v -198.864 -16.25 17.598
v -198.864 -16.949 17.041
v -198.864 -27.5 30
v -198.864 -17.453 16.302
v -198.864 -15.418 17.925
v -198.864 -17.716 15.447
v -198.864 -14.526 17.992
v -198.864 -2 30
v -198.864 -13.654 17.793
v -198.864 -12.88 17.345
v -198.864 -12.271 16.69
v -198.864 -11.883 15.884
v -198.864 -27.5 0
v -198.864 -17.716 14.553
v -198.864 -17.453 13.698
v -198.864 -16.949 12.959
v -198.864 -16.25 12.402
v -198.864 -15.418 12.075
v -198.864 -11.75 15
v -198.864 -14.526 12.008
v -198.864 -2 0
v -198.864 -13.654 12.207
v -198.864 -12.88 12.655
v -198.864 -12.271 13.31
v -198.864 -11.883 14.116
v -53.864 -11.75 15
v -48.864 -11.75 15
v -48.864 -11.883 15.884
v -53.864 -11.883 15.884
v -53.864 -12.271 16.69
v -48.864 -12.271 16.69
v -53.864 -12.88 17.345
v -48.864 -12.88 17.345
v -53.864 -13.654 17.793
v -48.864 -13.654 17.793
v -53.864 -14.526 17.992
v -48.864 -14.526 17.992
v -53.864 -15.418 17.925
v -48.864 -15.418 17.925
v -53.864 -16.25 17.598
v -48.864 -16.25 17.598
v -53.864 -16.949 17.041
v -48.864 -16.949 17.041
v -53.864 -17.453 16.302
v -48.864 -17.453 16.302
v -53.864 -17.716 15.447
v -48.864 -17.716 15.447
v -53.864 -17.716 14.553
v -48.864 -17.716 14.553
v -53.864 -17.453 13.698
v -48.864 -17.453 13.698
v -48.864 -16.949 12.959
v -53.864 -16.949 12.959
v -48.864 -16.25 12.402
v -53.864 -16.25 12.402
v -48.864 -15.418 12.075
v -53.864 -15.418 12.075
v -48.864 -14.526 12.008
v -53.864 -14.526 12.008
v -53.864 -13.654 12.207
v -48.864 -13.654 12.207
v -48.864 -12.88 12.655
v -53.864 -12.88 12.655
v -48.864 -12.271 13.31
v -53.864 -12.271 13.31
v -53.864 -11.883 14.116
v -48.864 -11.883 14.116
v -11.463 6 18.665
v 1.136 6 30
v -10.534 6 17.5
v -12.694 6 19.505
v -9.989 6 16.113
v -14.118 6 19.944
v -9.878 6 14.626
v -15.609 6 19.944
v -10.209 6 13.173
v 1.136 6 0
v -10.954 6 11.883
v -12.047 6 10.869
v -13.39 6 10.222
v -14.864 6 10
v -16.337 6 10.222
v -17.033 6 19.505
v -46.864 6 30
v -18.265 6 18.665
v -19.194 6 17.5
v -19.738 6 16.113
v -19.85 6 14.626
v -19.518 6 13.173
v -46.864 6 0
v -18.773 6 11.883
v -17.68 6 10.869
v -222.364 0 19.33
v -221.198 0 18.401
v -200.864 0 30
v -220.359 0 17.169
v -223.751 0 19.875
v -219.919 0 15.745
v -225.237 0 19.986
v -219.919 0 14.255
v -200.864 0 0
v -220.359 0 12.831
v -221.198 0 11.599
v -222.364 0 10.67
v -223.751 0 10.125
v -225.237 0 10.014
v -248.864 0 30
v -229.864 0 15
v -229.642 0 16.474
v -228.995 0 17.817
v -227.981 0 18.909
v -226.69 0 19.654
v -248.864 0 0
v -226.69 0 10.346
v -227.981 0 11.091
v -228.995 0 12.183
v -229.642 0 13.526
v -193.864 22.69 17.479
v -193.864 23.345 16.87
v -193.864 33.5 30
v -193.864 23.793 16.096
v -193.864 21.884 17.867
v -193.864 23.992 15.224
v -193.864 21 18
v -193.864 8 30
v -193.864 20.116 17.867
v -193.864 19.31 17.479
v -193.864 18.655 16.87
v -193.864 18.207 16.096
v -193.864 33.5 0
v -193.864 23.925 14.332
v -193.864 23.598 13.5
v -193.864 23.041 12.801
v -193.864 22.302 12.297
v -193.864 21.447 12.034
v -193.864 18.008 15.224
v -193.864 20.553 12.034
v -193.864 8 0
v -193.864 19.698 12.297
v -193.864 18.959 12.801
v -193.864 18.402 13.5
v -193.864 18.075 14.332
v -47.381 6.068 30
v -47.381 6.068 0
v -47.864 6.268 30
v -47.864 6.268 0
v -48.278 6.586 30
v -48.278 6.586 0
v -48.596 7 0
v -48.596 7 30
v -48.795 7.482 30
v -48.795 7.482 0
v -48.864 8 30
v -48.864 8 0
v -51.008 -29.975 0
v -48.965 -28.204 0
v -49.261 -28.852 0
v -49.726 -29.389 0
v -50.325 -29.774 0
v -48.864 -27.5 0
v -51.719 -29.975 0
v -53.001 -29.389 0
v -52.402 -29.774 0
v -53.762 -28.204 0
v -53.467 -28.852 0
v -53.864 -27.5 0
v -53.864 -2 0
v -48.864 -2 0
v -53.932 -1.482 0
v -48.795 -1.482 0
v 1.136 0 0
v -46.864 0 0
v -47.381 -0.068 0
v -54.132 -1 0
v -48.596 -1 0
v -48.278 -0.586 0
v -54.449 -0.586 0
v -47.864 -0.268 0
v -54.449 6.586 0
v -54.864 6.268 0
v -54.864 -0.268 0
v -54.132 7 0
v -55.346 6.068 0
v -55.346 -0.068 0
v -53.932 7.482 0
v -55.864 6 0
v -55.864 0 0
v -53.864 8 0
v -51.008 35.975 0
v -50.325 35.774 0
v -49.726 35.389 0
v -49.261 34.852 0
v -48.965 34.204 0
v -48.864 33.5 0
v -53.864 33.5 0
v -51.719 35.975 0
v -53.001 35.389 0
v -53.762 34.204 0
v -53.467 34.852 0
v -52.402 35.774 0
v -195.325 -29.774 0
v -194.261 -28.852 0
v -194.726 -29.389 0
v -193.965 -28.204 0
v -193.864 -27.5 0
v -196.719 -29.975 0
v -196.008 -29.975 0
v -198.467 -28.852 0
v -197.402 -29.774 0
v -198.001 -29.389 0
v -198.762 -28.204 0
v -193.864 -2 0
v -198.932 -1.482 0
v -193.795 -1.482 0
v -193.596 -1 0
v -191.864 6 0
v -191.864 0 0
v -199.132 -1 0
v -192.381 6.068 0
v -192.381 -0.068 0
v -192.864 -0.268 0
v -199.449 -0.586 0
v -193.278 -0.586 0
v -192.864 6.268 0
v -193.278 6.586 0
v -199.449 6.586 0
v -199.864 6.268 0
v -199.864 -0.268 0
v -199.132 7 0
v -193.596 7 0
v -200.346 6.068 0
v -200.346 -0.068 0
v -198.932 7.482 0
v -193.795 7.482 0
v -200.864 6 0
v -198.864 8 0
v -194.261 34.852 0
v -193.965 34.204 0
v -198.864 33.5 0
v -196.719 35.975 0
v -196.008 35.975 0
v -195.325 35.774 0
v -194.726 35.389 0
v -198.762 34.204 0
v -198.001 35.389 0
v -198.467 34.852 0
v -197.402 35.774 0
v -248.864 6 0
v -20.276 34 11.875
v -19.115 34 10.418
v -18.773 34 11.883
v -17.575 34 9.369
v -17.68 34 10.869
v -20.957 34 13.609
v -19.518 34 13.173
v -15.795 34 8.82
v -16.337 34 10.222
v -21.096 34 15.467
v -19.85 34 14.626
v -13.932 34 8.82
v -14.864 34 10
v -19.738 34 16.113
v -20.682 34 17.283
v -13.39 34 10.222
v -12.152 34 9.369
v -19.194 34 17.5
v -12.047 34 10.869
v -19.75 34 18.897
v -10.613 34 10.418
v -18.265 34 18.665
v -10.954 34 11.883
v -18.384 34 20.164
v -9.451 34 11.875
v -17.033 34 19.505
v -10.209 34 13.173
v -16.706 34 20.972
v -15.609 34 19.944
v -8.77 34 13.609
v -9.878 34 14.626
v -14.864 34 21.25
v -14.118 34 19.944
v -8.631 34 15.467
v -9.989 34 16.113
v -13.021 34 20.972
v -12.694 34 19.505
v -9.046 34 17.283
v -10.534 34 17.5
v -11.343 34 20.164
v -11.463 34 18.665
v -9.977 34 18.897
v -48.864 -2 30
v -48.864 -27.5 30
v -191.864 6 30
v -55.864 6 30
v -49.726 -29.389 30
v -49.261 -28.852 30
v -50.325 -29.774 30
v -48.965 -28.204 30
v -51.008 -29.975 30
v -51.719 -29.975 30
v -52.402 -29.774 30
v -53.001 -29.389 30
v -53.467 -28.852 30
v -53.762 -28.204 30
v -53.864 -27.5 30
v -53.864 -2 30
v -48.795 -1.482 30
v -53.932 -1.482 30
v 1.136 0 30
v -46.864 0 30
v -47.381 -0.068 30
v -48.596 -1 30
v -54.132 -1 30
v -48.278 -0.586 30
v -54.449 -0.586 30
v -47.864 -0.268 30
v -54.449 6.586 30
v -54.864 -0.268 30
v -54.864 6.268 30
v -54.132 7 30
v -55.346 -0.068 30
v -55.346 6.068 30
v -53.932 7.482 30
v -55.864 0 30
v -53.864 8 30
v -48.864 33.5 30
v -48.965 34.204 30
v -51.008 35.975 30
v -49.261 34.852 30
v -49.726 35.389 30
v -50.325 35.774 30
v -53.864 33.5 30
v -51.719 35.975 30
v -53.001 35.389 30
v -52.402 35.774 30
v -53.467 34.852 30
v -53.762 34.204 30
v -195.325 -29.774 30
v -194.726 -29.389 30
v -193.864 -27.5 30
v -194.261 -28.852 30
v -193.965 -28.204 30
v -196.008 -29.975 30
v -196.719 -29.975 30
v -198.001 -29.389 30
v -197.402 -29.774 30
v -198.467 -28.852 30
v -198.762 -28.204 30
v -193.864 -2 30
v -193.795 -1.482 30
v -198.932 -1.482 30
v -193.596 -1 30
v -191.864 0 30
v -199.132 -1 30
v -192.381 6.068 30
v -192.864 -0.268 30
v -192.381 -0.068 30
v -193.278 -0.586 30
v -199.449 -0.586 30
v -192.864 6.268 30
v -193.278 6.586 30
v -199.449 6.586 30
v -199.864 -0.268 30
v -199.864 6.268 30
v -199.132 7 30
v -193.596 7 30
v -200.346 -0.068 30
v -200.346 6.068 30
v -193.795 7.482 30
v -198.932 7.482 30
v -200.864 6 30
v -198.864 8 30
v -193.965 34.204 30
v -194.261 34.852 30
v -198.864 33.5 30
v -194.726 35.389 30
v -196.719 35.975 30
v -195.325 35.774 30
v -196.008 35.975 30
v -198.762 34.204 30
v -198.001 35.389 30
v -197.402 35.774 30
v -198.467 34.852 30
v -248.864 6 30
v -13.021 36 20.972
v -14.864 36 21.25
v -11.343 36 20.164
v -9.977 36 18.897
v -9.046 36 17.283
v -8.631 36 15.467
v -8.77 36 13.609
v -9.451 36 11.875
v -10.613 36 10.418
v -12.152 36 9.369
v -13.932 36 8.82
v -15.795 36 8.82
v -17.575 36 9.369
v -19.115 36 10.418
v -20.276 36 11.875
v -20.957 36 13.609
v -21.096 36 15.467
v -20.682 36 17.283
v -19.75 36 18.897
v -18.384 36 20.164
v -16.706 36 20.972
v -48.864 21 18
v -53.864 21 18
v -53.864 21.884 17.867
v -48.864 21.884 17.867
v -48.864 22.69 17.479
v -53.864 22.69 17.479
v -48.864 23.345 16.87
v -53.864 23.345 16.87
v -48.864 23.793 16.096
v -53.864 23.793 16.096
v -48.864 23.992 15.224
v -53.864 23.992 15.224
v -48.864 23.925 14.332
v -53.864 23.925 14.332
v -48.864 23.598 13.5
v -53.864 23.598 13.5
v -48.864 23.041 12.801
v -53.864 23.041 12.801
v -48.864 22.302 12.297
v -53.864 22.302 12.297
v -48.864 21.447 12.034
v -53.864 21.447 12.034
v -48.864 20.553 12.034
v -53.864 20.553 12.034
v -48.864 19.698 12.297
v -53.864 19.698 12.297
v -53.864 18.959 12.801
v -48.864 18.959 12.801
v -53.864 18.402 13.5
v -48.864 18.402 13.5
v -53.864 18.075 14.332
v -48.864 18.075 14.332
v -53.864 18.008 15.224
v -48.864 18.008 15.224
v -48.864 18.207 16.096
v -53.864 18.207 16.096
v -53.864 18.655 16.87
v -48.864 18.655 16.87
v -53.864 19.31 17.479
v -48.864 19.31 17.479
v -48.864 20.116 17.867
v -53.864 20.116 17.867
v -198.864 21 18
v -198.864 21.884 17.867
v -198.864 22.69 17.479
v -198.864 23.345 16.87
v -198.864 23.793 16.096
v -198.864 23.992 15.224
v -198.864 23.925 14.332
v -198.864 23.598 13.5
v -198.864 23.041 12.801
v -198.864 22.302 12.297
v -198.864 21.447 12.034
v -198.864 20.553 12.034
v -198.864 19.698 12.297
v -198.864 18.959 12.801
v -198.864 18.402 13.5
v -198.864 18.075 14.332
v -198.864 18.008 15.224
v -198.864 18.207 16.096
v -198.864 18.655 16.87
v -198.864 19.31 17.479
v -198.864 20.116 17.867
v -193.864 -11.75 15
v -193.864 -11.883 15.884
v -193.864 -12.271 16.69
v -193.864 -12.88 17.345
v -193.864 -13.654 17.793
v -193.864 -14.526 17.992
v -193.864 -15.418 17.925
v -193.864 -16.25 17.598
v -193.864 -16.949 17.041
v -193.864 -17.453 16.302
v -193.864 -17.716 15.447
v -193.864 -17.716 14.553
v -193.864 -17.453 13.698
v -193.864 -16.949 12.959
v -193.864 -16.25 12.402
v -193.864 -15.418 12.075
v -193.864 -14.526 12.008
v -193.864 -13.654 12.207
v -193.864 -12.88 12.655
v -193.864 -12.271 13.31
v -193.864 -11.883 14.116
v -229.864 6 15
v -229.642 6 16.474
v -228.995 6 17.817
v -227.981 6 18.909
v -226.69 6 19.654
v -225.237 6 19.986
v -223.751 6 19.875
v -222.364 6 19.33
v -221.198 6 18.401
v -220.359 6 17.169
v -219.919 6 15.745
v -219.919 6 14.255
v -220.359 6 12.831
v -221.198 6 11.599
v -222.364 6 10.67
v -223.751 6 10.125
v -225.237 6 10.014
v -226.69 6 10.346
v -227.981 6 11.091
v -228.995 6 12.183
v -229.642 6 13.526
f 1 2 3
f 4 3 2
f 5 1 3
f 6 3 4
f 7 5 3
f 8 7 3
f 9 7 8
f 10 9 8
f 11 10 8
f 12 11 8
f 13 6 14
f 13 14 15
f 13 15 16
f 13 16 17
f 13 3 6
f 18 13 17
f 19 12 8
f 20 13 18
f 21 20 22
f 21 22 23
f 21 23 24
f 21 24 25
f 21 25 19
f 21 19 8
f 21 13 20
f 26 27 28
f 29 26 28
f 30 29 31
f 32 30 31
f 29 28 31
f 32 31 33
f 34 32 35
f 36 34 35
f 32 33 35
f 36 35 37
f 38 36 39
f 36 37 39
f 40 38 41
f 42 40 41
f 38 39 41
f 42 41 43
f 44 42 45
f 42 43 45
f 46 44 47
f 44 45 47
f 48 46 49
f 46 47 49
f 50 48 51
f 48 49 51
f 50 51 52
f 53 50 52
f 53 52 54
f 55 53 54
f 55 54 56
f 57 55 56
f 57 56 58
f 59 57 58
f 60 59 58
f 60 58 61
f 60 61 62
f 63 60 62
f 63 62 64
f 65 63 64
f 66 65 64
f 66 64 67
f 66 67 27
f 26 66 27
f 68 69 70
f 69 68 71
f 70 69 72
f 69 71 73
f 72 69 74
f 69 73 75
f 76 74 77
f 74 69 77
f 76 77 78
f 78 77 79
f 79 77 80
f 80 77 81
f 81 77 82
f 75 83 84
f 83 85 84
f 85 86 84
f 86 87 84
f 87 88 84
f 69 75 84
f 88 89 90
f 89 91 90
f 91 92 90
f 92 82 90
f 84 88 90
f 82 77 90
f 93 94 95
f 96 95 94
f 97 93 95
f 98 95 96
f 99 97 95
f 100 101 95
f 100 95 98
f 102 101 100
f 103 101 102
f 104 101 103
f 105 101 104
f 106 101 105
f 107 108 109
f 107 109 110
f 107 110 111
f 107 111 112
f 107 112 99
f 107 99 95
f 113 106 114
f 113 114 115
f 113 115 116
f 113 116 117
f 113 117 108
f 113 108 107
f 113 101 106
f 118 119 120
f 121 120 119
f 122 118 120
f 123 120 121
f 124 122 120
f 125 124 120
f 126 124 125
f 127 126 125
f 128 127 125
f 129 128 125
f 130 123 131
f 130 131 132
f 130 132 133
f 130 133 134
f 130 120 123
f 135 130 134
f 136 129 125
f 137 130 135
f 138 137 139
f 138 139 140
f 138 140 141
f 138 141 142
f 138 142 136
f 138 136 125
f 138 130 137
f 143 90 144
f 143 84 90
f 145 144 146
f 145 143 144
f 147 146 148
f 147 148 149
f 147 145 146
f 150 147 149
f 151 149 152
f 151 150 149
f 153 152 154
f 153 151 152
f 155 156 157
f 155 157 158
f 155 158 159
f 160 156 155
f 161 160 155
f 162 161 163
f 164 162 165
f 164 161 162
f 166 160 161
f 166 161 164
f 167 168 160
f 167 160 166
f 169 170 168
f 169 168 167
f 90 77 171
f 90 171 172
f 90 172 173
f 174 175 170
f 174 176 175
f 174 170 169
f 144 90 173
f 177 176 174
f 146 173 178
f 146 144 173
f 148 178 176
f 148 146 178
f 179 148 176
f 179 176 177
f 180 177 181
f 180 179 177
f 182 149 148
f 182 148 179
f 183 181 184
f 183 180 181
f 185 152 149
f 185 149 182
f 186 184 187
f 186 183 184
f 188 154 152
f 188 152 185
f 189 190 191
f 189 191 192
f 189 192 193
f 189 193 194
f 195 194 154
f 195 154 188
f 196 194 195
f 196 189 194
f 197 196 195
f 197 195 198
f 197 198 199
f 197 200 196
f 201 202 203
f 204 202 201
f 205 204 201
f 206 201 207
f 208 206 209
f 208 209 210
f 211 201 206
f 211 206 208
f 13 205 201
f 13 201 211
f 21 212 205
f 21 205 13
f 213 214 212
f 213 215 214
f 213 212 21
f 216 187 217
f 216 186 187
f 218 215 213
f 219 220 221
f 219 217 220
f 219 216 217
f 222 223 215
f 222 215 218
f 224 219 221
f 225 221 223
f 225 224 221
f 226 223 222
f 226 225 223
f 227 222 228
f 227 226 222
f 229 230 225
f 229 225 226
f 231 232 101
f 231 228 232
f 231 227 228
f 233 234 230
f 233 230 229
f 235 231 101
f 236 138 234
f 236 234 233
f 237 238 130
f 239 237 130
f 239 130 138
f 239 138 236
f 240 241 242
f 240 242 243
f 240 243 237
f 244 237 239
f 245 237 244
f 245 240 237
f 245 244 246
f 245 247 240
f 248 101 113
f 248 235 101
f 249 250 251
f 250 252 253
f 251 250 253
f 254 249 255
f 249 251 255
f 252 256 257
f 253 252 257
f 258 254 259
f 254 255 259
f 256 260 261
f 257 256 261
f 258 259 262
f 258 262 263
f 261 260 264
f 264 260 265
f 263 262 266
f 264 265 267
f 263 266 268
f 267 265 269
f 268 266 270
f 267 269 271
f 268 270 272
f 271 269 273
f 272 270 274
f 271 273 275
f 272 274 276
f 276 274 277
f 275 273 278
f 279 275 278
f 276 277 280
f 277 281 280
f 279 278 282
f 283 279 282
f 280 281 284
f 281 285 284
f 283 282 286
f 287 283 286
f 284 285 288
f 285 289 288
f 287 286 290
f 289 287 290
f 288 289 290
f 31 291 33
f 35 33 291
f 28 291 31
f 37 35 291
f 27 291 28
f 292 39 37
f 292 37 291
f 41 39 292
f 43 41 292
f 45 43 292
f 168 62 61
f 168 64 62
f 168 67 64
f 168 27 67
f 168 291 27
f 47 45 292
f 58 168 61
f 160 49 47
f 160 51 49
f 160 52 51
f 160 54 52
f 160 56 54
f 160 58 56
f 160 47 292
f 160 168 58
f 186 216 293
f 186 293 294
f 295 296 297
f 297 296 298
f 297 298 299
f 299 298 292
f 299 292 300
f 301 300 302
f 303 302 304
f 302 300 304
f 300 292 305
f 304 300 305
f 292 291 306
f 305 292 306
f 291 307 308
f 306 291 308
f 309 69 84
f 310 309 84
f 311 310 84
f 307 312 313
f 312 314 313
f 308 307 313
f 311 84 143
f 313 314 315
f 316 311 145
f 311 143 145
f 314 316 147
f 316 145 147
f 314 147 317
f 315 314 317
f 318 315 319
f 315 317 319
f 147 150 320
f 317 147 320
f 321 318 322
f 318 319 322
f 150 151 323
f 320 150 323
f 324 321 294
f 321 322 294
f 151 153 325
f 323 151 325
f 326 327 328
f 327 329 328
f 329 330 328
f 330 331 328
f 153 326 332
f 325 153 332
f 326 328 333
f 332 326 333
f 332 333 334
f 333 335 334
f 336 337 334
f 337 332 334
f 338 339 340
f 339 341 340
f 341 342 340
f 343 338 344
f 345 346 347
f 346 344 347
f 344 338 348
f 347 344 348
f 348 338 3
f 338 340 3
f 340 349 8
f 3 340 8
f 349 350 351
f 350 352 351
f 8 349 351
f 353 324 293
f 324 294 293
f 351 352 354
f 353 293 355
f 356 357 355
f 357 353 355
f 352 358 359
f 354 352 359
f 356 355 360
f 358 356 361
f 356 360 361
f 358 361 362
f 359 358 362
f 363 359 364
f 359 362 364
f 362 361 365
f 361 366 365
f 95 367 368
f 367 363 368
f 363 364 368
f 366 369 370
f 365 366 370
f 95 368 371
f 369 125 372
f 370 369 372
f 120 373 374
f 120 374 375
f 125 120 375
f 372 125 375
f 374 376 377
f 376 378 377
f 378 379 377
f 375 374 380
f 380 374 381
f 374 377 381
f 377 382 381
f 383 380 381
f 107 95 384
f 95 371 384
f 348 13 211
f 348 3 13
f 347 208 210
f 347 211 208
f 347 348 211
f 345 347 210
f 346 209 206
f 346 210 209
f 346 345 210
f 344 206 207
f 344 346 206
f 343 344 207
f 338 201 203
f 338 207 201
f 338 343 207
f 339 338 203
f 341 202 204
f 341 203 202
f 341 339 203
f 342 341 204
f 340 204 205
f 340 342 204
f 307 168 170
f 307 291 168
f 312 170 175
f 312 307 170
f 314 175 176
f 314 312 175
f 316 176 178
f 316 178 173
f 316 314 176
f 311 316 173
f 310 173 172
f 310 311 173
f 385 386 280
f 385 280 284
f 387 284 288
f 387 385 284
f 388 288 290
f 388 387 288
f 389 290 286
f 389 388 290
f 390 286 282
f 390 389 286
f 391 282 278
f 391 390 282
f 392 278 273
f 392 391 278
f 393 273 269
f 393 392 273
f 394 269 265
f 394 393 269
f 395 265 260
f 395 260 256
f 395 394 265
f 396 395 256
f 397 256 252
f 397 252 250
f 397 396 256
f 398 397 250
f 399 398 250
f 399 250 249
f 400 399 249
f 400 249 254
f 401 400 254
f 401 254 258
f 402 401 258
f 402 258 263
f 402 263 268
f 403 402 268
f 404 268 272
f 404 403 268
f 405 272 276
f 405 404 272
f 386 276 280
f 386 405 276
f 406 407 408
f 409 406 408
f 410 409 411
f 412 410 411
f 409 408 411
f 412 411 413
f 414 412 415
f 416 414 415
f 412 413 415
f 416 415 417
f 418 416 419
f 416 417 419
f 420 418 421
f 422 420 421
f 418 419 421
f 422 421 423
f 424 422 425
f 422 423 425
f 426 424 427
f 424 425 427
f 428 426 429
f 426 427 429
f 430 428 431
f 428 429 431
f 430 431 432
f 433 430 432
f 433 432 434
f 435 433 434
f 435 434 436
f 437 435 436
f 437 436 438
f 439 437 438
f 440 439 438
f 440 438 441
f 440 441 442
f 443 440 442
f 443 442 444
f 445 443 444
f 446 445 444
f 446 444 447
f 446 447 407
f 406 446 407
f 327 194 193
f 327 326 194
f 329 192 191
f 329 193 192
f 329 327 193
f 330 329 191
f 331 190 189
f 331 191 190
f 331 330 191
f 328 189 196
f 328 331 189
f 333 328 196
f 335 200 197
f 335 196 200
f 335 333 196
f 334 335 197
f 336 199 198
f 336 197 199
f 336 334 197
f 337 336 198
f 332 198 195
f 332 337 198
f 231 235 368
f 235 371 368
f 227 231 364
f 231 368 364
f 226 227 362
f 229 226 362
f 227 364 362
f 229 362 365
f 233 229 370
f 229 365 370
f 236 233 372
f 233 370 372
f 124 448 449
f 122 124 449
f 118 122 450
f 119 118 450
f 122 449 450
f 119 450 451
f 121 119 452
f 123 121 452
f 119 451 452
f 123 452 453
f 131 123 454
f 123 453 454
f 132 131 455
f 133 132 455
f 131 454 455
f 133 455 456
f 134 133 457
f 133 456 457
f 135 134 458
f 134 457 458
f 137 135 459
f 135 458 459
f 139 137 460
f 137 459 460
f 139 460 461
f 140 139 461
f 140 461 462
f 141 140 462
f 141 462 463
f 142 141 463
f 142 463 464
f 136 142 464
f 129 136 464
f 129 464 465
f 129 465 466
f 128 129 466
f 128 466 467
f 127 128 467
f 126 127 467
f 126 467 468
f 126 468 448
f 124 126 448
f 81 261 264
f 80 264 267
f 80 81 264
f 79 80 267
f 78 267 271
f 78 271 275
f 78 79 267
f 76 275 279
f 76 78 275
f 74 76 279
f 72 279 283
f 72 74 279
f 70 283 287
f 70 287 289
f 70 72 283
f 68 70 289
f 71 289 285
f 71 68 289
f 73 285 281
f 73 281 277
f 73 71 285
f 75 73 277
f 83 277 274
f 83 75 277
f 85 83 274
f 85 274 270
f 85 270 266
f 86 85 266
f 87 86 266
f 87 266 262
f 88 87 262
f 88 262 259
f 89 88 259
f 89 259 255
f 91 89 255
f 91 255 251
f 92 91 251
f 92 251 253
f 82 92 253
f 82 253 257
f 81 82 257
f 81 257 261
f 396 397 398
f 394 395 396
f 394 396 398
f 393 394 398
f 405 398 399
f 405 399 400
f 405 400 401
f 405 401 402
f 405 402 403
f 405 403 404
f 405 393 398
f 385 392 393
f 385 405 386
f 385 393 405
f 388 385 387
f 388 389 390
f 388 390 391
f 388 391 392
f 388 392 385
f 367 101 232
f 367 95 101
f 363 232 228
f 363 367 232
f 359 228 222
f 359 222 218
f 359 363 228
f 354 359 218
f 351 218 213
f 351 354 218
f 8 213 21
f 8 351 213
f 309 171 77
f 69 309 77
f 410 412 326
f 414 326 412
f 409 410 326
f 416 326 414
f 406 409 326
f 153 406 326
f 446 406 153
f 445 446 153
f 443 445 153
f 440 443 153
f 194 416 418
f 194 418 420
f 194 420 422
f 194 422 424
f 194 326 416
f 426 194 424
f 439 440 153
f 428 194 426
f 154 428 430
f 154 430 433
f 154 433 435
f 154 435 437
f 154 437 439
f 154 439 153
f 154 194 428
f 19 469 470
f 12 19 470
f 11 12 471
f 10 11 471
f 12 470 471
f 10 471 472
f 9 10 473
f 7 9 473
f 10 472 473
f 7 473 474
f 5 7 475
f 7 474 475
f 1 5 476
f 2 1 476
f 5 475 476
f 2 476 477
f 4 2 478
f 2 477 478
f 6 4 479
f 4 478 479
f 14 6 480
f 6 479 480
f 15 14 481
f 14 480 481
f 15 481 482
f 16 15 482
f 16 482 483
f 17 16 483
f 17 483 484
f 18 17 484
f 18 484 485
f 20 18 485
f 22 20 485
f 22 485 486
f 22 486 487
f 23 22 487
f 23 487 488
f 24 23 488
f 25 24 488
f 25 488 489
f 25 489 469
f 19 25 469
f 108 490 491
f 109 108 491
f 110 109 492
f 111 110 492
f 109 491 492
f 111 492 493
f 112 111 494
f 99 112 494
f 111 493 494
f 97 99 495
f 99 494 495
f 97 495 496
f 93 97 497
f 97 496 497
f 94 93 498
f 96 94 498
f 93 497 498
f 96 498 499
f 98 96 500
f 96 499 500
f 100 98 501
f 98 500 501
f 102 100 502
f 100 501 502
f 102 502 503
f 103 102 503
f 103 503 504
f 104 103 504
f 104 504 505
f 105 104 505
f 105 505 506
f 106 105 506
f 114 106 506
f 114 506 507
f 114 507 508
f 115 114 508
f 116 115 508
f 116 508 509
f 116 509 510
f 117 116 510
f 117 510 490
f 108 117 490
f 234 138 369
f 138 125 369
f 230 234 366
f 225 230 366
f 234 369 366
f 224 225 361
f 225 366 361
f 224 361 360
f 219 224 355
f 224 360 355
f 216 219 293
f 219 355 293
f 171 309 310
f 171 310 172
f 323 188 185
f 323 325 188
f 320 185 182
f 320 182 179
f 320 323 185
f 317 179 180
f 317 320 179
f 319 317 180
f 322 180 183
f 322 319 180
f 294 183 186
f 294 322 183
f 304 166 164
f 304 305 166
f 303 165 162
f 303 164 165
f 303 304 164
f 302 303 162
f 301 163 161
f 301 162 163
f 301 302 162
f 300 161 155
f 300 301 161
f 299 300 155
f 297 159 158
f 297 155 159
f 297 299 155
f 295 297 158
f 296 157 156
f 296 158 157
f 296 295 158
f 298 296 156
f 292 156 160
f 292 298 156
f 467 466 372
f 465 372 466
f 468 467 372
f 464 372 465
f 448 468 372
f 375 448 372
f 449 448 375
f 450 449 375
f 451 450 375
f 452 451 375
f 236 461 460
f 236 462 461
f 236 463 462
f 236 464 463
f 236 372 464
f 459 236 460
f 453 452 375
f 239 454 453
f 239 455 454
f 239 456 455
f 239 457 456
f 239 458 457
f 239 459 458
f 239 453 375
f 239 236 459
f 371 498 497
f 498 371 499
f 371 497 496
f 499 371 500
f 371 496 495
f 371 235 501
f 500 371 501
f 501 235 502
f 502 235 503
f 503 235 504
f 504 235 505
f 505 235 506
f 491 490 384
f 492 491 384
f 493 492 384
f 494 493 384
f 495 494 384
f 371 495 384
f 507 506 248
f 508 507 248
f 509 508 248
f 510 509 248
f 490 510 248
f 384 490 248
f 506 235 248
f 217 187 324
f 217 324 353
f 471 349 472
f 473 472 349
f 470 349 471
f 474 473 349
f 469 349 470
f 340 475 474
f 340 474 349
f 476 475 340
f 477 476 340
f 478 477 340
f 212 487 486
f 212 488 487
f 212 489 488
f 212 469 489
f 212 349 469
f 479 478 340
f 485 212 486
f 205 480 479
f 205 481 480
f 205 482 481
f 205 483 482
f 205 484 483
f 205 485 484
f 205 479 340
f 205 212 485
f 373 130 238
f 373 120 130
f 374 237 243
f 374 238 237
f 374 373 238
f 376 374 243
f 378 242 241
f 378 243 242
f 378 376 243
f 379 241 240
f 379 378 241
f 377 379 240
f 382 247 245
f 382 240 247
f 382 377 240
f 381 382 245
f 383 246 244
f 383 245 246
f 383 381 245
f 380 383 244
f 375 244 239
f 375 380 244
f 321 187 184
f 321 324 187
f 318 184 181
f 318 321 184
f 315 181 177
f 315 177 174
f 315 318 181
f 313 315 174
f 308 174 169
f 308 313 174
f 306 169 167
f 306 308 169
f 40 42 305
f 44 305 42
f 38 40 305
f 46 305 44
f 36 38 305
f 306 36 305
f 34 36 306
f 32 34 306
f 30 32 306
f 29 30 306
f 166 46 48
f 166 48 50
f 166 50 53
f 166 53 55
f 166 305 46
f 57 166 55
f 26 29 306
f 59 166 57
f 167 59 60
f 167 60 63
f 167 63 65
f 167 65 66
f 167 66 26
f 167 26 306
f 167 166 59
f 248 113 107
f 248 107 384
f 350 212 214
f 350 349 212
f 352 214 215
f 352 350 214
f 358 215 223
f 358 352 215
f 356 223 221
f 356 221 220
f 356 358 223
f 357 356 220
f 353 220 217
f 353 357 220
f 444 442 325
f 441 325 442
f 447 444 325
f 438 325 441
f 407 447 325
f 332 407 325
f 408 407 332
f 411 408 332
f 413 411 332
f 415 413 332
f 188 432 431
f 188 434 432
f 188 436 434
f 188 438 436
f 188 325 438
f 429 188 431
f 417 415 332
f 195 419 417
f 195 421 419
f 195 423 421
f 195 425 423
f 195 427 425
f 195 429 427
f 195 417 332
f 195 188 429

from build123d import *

# Parameters (mm, degrees)
BOSS_EXTRUDE1_DEPTH  = 30
FILLET1_R            = 2
FILLET2_RADIUS       = 2.5
FILLET2_LENGTH       = 30
FILLET3_RADIUS       = 2.5
FILLET3_LENGTH       = 30
FILLET4_R            = 2
SKETCH2_R            = 3
CUT_EXTRUDE4_DEPTH   = 163
SKETCH9_W            = 10
SKETCH9_H            = 6
BOSS_EXTRUDE8_DEPTH  = 30
SKETCH14_W           = 20
SKETCH14_H           = 6
BOSS_EXTRUDE12_DEPTH = 30
FILLET10_RADIUS      = 2.5
FILLET10_LENGTH      = 30
FILLET11_RADIUS      = 2.5
FILLET11_LENGTH      = 30
FILLET12_R           = 2
SKETCH16_R           = 3
CUT_EXTRUDE6_DEPTH   = 200
SKETCH17_W           = 30
SKETCH17_H           = 6
BOSS_EXTRUDE15_DEPTH = 30
SKETCH20_R           = 5
BOSS_EXTRUDE16_DEPTH = 36
SKETCH21_R           = 6.25
BOSS_EXTRUDE17_DEPTH = 2
SKETCH22_R           = 5
CUT_EXTRUDE7_DEPTH   = 10


with BuildPart() as part:
    # Sketch1 → Boss-Extrude1 (new body)
    with BuildSketch(Plane.XY):
        Polygon((-28.863636364, 0), (-48.863636364, 0), (-48.863636364, -30), (-53.863636364, -30), (-53.863636364, 0), (-193.863636364, 0), (-193.863636364, -30), (-198.863636364, -30), (-198.863636364, 0), (-218.863636364, 0), (-218.863636364, 6), (-198.863636364, 6), (-198.863636364, 36), (-193.863636364, 36), (-193.863636364, 6), (-53.863636364, 6), (-53.863636364, 36), (-48.863636364, 36), (-48.863636364, 6), (-28.863636364, 6), align=None)
    extrude(amount=BOSS_EXTRUDE1_DEPTH)

    # Fillet1
    fillet1_edges = [part.edges().sort_by_distance(p)[0] for p in [
        (-198.863636364, 6, 15),
        (-193.863636364, 6, 15),
    ]]
    fillet(fillet1_edges, radius=FILLET1_R)

    # Fillet2: full round fillet: the end face becomes a half cylinder, R = half its width
    fillet2_face = Plane((-196.363636364, 36, 15), x_dir=(0, 0, 1), z_dir=(0, 1, 0))  # on the end face: x along it, z out of the body
    fillet2_slab = fillet2_face.offset(-FILLET2_RADIUS / 2) * Box(FILLET2_LENGTH, 2 * FILLET2_RADIUS, FILLET2_RADIUS, mode=Mode.PRIVATE)  # the body's end, R deep
    fillet2_round = Plane((-196.363636364, 33.5, 15), x_dir=(0, 1, 0), z_dir=(0, 0, 1)) * Cylinder(FILLET2_RADIUS, FILLET2_LENGTH, mode=Mode.PRIVATE)  # its axis R under the face
    add(fillet2_slab - fillet2_round, mode=Mode.SUBTRACT)

    # Fillet3: full round fillet: the end face becomes a half cylinder, R = half its width
    fillet3_face = Plane((-51.363636364, 36, 15), x_dir=(0, 0, 1), z_dir=(0, 1, 0))  # on the end face: x along it, z out of the body
    fillet3_slab = fillet3_face.offset(-FILLET3_RADIUS / 2) * Box(FILLET3_LENGTH, 2 * FILLET3_RADIUS, FILLET3_RADIUS, mode=Mode.PRIVATE)  # the body's end, R deep
    fillet3_round = Plane((-51.363636364, 33.5, 15), x_dir=(0, 1, 0), z_dir=(0, 0, 1)) * Cylinder(FILLET3_RADIUS, FILLET3_LENGTH, mode=Mode.PRIVATE)  # its axis R under the face
    add(fillet3_slab - fillet3_round, mode=Mode.SUBTRACT)

    # Fillet4
    fillet4_edges = [part.edges().sort_by_distance(p)[0] for p in [
        (-53.863636364, 6, 15),
        (-48.863636364, 6, 15),
    ]]
    fillet(fillet4_edges, radius=FILLET4_R)

    # Sketch2 → Cut-Extrude4 (cut)
    with BuildSketch(Plane.ZY.offset(198.863636364)):
        with Locations((15, 21)):
            Circle(SKETCH2_R)
    extrude(amount=-CUT_EXTRUDE4_DEPTH, mode=Mode.SUBTRACT)

    # Sketch9 → Boss-Extrude8 (add)
    with BuildSketch(Plane(origin=(0, 0, 0), x_dir=(-1, 0, 0), z_dir=(0, 0, -1))):
        with Locations((223.863636364, 3)):
            Rectangle(SKETCH9_W, SKETCH9_H)
    extrude(amount=-BOSS_EXTRUDE8_DEPTH)

    # Sketch14 → Boss-Extrude12 (add)
    with BuildSketch(Plane(origin=(0, 0, 0), x_dir=(-1, 0, 0), z_dir=(0, 0, -1))):
        with Locations((238.863636364, 3)):
            Rectangle(SKETCH14_W, SKETCH14_H)
    extrude(amount=-BOSS_EXTRUDE12_DEPTH)

    # Fillet10: full round fillet: the end face becomes a half cylinder, R = half its width
    fillet10_face = Plane((-51.363636364, -30, 15), x_dir=(0, 0, 1), z_dir=(0, -1, 0))  # on the end face: x along it, z out of the body
    fillet10_slab = fillet10_face.offset(-FILLET10_RADIUS / 2) * Box(FILLET10_LENGTH, 2 * FILLET10_RADIUS, FILLET10_RADIUS, mode=Mode.PRIVATE)  # the body's end, R deep
    fillet10_round = Plane((-51.363636364, -27.5, 15), x_dir=(0, -1, 0), z_dir=(0, 0, 1)) * Cylinder(FILLET10_RADIUS, FILLET10_LENGTH, mode=Mode.PRIVATE)  # its axis R under the face
    add(fillet10_slab - fillet10_round, mode=Mode.SUBTRACT)

    # Fillet11: full round fillet: the end face becomes a half cylinder, R = half its width
    fillet11_face = Plane((-196.363636364, -30, 15), x_dir=(0, 0, 1), z_dir=(0, -1, 0))  # on the end face: x along it, z out of the body
    fillet11_slab = fillet11_face.offset(-FILLET11_RADIUS / 2) * Box(FILLET11_LENGTH, 2 * FILLET11_RADIUS, FILLET11_RADIUS, mode=Mode.PRIVATE)  # the body's end, R deep
    fillet11_round = Plane((-196.363636364, -27.5, 15), x_dir=(0, -1, 0), z_dir=(0, 0, 1)) * Cylinder(FILLET11_RADIUS, FILLET11_LENGTH, mode=Mode.PRIVATE)  # its axis R under the face
    add(fillet11_slab - fillet11_round, mode=Mode.SUBTRACT)

    # Fillet12
    fillet12_edges = [part.edges().sort_by_distance(p)[0] for p in [
        (-48.863636364, 0, 15),
        (-53.863636364, 0, 15),
        (-193.863636364, 0, 15),
        (-198.863636364, 0, 15),
    ]]
    fillet(fillet12_edges, radius=FILLET12_R)

    # Sketch16 → Cut-Extrude6 (cut)
    with BuildSketch(Plane(origin=(-48.863636364, 0, 0), x_dir=(0, 0, -1), z_dir=(1, 0, 0))):
        with Locations(Location((-15, -14.75, 0), (0, 0, 90))):
            Circle(SKETCH16_R)
    extrude(amount=-CUT_EXTRUDE6_DEPTH, mode=Mode.SUBTRACT)

    # Sketch17 → Boss-Extrude15 (add)
    with BuildSketch(Plane(origin=(0, 0, 0), x_dir=(-1, 0, 0), z_dir=(0, 0, -1))):
        with Locations((13.863636364, 3)):
            Rectangle(SKETCH17_W, SKETCH17_H)
    extrude(amount=-BOSS_EXTRUDE15_DEPTH)

    # Sketch20 → Boss-Extrude16 (add)
    with BuildSketch(Plane(origin=(0, 0, 0), x_dir=(-1, 0, 0), z_dir=(0, -1, 0))):
        with Locations(Location((14.863636364, -15, 0), (0, 0, 90))):
            Circle(SKETCH20_R)
    extrude(amount=-BOSS_EXTRUDE16_DEPTH)

    # Sketch21 → Boss-Extrude17 (add)
    with BuildSketch(Plane(origin=(0, 36, 0), x_dir=(-1, 0, 0), z_dir=(0, 1, 0))):
        with Locations(Location((14.863636364, 15, 0), (0, 0, 90))):
            Circle(SKETCH21_R)
    extrude(amount=-BOSS_EXTRUDE17_DEPTH)

    # Sketch22 → Cut-Extrude7 (cut)
    with BuildSketch(Plane(origin=(0, 6, 0), x_dir=(1, 0, 0), z_dir=(0, 1, 0))):
        with Locations(Location((-224.863636364, -15, 0), (0, 0, 180))):
            Circle(SKETCH22_R)
    extrude(amount=-CUT_EXTRUDE7_DEPTH, mode=Mode.SUBTRACT)


solid = part.part
